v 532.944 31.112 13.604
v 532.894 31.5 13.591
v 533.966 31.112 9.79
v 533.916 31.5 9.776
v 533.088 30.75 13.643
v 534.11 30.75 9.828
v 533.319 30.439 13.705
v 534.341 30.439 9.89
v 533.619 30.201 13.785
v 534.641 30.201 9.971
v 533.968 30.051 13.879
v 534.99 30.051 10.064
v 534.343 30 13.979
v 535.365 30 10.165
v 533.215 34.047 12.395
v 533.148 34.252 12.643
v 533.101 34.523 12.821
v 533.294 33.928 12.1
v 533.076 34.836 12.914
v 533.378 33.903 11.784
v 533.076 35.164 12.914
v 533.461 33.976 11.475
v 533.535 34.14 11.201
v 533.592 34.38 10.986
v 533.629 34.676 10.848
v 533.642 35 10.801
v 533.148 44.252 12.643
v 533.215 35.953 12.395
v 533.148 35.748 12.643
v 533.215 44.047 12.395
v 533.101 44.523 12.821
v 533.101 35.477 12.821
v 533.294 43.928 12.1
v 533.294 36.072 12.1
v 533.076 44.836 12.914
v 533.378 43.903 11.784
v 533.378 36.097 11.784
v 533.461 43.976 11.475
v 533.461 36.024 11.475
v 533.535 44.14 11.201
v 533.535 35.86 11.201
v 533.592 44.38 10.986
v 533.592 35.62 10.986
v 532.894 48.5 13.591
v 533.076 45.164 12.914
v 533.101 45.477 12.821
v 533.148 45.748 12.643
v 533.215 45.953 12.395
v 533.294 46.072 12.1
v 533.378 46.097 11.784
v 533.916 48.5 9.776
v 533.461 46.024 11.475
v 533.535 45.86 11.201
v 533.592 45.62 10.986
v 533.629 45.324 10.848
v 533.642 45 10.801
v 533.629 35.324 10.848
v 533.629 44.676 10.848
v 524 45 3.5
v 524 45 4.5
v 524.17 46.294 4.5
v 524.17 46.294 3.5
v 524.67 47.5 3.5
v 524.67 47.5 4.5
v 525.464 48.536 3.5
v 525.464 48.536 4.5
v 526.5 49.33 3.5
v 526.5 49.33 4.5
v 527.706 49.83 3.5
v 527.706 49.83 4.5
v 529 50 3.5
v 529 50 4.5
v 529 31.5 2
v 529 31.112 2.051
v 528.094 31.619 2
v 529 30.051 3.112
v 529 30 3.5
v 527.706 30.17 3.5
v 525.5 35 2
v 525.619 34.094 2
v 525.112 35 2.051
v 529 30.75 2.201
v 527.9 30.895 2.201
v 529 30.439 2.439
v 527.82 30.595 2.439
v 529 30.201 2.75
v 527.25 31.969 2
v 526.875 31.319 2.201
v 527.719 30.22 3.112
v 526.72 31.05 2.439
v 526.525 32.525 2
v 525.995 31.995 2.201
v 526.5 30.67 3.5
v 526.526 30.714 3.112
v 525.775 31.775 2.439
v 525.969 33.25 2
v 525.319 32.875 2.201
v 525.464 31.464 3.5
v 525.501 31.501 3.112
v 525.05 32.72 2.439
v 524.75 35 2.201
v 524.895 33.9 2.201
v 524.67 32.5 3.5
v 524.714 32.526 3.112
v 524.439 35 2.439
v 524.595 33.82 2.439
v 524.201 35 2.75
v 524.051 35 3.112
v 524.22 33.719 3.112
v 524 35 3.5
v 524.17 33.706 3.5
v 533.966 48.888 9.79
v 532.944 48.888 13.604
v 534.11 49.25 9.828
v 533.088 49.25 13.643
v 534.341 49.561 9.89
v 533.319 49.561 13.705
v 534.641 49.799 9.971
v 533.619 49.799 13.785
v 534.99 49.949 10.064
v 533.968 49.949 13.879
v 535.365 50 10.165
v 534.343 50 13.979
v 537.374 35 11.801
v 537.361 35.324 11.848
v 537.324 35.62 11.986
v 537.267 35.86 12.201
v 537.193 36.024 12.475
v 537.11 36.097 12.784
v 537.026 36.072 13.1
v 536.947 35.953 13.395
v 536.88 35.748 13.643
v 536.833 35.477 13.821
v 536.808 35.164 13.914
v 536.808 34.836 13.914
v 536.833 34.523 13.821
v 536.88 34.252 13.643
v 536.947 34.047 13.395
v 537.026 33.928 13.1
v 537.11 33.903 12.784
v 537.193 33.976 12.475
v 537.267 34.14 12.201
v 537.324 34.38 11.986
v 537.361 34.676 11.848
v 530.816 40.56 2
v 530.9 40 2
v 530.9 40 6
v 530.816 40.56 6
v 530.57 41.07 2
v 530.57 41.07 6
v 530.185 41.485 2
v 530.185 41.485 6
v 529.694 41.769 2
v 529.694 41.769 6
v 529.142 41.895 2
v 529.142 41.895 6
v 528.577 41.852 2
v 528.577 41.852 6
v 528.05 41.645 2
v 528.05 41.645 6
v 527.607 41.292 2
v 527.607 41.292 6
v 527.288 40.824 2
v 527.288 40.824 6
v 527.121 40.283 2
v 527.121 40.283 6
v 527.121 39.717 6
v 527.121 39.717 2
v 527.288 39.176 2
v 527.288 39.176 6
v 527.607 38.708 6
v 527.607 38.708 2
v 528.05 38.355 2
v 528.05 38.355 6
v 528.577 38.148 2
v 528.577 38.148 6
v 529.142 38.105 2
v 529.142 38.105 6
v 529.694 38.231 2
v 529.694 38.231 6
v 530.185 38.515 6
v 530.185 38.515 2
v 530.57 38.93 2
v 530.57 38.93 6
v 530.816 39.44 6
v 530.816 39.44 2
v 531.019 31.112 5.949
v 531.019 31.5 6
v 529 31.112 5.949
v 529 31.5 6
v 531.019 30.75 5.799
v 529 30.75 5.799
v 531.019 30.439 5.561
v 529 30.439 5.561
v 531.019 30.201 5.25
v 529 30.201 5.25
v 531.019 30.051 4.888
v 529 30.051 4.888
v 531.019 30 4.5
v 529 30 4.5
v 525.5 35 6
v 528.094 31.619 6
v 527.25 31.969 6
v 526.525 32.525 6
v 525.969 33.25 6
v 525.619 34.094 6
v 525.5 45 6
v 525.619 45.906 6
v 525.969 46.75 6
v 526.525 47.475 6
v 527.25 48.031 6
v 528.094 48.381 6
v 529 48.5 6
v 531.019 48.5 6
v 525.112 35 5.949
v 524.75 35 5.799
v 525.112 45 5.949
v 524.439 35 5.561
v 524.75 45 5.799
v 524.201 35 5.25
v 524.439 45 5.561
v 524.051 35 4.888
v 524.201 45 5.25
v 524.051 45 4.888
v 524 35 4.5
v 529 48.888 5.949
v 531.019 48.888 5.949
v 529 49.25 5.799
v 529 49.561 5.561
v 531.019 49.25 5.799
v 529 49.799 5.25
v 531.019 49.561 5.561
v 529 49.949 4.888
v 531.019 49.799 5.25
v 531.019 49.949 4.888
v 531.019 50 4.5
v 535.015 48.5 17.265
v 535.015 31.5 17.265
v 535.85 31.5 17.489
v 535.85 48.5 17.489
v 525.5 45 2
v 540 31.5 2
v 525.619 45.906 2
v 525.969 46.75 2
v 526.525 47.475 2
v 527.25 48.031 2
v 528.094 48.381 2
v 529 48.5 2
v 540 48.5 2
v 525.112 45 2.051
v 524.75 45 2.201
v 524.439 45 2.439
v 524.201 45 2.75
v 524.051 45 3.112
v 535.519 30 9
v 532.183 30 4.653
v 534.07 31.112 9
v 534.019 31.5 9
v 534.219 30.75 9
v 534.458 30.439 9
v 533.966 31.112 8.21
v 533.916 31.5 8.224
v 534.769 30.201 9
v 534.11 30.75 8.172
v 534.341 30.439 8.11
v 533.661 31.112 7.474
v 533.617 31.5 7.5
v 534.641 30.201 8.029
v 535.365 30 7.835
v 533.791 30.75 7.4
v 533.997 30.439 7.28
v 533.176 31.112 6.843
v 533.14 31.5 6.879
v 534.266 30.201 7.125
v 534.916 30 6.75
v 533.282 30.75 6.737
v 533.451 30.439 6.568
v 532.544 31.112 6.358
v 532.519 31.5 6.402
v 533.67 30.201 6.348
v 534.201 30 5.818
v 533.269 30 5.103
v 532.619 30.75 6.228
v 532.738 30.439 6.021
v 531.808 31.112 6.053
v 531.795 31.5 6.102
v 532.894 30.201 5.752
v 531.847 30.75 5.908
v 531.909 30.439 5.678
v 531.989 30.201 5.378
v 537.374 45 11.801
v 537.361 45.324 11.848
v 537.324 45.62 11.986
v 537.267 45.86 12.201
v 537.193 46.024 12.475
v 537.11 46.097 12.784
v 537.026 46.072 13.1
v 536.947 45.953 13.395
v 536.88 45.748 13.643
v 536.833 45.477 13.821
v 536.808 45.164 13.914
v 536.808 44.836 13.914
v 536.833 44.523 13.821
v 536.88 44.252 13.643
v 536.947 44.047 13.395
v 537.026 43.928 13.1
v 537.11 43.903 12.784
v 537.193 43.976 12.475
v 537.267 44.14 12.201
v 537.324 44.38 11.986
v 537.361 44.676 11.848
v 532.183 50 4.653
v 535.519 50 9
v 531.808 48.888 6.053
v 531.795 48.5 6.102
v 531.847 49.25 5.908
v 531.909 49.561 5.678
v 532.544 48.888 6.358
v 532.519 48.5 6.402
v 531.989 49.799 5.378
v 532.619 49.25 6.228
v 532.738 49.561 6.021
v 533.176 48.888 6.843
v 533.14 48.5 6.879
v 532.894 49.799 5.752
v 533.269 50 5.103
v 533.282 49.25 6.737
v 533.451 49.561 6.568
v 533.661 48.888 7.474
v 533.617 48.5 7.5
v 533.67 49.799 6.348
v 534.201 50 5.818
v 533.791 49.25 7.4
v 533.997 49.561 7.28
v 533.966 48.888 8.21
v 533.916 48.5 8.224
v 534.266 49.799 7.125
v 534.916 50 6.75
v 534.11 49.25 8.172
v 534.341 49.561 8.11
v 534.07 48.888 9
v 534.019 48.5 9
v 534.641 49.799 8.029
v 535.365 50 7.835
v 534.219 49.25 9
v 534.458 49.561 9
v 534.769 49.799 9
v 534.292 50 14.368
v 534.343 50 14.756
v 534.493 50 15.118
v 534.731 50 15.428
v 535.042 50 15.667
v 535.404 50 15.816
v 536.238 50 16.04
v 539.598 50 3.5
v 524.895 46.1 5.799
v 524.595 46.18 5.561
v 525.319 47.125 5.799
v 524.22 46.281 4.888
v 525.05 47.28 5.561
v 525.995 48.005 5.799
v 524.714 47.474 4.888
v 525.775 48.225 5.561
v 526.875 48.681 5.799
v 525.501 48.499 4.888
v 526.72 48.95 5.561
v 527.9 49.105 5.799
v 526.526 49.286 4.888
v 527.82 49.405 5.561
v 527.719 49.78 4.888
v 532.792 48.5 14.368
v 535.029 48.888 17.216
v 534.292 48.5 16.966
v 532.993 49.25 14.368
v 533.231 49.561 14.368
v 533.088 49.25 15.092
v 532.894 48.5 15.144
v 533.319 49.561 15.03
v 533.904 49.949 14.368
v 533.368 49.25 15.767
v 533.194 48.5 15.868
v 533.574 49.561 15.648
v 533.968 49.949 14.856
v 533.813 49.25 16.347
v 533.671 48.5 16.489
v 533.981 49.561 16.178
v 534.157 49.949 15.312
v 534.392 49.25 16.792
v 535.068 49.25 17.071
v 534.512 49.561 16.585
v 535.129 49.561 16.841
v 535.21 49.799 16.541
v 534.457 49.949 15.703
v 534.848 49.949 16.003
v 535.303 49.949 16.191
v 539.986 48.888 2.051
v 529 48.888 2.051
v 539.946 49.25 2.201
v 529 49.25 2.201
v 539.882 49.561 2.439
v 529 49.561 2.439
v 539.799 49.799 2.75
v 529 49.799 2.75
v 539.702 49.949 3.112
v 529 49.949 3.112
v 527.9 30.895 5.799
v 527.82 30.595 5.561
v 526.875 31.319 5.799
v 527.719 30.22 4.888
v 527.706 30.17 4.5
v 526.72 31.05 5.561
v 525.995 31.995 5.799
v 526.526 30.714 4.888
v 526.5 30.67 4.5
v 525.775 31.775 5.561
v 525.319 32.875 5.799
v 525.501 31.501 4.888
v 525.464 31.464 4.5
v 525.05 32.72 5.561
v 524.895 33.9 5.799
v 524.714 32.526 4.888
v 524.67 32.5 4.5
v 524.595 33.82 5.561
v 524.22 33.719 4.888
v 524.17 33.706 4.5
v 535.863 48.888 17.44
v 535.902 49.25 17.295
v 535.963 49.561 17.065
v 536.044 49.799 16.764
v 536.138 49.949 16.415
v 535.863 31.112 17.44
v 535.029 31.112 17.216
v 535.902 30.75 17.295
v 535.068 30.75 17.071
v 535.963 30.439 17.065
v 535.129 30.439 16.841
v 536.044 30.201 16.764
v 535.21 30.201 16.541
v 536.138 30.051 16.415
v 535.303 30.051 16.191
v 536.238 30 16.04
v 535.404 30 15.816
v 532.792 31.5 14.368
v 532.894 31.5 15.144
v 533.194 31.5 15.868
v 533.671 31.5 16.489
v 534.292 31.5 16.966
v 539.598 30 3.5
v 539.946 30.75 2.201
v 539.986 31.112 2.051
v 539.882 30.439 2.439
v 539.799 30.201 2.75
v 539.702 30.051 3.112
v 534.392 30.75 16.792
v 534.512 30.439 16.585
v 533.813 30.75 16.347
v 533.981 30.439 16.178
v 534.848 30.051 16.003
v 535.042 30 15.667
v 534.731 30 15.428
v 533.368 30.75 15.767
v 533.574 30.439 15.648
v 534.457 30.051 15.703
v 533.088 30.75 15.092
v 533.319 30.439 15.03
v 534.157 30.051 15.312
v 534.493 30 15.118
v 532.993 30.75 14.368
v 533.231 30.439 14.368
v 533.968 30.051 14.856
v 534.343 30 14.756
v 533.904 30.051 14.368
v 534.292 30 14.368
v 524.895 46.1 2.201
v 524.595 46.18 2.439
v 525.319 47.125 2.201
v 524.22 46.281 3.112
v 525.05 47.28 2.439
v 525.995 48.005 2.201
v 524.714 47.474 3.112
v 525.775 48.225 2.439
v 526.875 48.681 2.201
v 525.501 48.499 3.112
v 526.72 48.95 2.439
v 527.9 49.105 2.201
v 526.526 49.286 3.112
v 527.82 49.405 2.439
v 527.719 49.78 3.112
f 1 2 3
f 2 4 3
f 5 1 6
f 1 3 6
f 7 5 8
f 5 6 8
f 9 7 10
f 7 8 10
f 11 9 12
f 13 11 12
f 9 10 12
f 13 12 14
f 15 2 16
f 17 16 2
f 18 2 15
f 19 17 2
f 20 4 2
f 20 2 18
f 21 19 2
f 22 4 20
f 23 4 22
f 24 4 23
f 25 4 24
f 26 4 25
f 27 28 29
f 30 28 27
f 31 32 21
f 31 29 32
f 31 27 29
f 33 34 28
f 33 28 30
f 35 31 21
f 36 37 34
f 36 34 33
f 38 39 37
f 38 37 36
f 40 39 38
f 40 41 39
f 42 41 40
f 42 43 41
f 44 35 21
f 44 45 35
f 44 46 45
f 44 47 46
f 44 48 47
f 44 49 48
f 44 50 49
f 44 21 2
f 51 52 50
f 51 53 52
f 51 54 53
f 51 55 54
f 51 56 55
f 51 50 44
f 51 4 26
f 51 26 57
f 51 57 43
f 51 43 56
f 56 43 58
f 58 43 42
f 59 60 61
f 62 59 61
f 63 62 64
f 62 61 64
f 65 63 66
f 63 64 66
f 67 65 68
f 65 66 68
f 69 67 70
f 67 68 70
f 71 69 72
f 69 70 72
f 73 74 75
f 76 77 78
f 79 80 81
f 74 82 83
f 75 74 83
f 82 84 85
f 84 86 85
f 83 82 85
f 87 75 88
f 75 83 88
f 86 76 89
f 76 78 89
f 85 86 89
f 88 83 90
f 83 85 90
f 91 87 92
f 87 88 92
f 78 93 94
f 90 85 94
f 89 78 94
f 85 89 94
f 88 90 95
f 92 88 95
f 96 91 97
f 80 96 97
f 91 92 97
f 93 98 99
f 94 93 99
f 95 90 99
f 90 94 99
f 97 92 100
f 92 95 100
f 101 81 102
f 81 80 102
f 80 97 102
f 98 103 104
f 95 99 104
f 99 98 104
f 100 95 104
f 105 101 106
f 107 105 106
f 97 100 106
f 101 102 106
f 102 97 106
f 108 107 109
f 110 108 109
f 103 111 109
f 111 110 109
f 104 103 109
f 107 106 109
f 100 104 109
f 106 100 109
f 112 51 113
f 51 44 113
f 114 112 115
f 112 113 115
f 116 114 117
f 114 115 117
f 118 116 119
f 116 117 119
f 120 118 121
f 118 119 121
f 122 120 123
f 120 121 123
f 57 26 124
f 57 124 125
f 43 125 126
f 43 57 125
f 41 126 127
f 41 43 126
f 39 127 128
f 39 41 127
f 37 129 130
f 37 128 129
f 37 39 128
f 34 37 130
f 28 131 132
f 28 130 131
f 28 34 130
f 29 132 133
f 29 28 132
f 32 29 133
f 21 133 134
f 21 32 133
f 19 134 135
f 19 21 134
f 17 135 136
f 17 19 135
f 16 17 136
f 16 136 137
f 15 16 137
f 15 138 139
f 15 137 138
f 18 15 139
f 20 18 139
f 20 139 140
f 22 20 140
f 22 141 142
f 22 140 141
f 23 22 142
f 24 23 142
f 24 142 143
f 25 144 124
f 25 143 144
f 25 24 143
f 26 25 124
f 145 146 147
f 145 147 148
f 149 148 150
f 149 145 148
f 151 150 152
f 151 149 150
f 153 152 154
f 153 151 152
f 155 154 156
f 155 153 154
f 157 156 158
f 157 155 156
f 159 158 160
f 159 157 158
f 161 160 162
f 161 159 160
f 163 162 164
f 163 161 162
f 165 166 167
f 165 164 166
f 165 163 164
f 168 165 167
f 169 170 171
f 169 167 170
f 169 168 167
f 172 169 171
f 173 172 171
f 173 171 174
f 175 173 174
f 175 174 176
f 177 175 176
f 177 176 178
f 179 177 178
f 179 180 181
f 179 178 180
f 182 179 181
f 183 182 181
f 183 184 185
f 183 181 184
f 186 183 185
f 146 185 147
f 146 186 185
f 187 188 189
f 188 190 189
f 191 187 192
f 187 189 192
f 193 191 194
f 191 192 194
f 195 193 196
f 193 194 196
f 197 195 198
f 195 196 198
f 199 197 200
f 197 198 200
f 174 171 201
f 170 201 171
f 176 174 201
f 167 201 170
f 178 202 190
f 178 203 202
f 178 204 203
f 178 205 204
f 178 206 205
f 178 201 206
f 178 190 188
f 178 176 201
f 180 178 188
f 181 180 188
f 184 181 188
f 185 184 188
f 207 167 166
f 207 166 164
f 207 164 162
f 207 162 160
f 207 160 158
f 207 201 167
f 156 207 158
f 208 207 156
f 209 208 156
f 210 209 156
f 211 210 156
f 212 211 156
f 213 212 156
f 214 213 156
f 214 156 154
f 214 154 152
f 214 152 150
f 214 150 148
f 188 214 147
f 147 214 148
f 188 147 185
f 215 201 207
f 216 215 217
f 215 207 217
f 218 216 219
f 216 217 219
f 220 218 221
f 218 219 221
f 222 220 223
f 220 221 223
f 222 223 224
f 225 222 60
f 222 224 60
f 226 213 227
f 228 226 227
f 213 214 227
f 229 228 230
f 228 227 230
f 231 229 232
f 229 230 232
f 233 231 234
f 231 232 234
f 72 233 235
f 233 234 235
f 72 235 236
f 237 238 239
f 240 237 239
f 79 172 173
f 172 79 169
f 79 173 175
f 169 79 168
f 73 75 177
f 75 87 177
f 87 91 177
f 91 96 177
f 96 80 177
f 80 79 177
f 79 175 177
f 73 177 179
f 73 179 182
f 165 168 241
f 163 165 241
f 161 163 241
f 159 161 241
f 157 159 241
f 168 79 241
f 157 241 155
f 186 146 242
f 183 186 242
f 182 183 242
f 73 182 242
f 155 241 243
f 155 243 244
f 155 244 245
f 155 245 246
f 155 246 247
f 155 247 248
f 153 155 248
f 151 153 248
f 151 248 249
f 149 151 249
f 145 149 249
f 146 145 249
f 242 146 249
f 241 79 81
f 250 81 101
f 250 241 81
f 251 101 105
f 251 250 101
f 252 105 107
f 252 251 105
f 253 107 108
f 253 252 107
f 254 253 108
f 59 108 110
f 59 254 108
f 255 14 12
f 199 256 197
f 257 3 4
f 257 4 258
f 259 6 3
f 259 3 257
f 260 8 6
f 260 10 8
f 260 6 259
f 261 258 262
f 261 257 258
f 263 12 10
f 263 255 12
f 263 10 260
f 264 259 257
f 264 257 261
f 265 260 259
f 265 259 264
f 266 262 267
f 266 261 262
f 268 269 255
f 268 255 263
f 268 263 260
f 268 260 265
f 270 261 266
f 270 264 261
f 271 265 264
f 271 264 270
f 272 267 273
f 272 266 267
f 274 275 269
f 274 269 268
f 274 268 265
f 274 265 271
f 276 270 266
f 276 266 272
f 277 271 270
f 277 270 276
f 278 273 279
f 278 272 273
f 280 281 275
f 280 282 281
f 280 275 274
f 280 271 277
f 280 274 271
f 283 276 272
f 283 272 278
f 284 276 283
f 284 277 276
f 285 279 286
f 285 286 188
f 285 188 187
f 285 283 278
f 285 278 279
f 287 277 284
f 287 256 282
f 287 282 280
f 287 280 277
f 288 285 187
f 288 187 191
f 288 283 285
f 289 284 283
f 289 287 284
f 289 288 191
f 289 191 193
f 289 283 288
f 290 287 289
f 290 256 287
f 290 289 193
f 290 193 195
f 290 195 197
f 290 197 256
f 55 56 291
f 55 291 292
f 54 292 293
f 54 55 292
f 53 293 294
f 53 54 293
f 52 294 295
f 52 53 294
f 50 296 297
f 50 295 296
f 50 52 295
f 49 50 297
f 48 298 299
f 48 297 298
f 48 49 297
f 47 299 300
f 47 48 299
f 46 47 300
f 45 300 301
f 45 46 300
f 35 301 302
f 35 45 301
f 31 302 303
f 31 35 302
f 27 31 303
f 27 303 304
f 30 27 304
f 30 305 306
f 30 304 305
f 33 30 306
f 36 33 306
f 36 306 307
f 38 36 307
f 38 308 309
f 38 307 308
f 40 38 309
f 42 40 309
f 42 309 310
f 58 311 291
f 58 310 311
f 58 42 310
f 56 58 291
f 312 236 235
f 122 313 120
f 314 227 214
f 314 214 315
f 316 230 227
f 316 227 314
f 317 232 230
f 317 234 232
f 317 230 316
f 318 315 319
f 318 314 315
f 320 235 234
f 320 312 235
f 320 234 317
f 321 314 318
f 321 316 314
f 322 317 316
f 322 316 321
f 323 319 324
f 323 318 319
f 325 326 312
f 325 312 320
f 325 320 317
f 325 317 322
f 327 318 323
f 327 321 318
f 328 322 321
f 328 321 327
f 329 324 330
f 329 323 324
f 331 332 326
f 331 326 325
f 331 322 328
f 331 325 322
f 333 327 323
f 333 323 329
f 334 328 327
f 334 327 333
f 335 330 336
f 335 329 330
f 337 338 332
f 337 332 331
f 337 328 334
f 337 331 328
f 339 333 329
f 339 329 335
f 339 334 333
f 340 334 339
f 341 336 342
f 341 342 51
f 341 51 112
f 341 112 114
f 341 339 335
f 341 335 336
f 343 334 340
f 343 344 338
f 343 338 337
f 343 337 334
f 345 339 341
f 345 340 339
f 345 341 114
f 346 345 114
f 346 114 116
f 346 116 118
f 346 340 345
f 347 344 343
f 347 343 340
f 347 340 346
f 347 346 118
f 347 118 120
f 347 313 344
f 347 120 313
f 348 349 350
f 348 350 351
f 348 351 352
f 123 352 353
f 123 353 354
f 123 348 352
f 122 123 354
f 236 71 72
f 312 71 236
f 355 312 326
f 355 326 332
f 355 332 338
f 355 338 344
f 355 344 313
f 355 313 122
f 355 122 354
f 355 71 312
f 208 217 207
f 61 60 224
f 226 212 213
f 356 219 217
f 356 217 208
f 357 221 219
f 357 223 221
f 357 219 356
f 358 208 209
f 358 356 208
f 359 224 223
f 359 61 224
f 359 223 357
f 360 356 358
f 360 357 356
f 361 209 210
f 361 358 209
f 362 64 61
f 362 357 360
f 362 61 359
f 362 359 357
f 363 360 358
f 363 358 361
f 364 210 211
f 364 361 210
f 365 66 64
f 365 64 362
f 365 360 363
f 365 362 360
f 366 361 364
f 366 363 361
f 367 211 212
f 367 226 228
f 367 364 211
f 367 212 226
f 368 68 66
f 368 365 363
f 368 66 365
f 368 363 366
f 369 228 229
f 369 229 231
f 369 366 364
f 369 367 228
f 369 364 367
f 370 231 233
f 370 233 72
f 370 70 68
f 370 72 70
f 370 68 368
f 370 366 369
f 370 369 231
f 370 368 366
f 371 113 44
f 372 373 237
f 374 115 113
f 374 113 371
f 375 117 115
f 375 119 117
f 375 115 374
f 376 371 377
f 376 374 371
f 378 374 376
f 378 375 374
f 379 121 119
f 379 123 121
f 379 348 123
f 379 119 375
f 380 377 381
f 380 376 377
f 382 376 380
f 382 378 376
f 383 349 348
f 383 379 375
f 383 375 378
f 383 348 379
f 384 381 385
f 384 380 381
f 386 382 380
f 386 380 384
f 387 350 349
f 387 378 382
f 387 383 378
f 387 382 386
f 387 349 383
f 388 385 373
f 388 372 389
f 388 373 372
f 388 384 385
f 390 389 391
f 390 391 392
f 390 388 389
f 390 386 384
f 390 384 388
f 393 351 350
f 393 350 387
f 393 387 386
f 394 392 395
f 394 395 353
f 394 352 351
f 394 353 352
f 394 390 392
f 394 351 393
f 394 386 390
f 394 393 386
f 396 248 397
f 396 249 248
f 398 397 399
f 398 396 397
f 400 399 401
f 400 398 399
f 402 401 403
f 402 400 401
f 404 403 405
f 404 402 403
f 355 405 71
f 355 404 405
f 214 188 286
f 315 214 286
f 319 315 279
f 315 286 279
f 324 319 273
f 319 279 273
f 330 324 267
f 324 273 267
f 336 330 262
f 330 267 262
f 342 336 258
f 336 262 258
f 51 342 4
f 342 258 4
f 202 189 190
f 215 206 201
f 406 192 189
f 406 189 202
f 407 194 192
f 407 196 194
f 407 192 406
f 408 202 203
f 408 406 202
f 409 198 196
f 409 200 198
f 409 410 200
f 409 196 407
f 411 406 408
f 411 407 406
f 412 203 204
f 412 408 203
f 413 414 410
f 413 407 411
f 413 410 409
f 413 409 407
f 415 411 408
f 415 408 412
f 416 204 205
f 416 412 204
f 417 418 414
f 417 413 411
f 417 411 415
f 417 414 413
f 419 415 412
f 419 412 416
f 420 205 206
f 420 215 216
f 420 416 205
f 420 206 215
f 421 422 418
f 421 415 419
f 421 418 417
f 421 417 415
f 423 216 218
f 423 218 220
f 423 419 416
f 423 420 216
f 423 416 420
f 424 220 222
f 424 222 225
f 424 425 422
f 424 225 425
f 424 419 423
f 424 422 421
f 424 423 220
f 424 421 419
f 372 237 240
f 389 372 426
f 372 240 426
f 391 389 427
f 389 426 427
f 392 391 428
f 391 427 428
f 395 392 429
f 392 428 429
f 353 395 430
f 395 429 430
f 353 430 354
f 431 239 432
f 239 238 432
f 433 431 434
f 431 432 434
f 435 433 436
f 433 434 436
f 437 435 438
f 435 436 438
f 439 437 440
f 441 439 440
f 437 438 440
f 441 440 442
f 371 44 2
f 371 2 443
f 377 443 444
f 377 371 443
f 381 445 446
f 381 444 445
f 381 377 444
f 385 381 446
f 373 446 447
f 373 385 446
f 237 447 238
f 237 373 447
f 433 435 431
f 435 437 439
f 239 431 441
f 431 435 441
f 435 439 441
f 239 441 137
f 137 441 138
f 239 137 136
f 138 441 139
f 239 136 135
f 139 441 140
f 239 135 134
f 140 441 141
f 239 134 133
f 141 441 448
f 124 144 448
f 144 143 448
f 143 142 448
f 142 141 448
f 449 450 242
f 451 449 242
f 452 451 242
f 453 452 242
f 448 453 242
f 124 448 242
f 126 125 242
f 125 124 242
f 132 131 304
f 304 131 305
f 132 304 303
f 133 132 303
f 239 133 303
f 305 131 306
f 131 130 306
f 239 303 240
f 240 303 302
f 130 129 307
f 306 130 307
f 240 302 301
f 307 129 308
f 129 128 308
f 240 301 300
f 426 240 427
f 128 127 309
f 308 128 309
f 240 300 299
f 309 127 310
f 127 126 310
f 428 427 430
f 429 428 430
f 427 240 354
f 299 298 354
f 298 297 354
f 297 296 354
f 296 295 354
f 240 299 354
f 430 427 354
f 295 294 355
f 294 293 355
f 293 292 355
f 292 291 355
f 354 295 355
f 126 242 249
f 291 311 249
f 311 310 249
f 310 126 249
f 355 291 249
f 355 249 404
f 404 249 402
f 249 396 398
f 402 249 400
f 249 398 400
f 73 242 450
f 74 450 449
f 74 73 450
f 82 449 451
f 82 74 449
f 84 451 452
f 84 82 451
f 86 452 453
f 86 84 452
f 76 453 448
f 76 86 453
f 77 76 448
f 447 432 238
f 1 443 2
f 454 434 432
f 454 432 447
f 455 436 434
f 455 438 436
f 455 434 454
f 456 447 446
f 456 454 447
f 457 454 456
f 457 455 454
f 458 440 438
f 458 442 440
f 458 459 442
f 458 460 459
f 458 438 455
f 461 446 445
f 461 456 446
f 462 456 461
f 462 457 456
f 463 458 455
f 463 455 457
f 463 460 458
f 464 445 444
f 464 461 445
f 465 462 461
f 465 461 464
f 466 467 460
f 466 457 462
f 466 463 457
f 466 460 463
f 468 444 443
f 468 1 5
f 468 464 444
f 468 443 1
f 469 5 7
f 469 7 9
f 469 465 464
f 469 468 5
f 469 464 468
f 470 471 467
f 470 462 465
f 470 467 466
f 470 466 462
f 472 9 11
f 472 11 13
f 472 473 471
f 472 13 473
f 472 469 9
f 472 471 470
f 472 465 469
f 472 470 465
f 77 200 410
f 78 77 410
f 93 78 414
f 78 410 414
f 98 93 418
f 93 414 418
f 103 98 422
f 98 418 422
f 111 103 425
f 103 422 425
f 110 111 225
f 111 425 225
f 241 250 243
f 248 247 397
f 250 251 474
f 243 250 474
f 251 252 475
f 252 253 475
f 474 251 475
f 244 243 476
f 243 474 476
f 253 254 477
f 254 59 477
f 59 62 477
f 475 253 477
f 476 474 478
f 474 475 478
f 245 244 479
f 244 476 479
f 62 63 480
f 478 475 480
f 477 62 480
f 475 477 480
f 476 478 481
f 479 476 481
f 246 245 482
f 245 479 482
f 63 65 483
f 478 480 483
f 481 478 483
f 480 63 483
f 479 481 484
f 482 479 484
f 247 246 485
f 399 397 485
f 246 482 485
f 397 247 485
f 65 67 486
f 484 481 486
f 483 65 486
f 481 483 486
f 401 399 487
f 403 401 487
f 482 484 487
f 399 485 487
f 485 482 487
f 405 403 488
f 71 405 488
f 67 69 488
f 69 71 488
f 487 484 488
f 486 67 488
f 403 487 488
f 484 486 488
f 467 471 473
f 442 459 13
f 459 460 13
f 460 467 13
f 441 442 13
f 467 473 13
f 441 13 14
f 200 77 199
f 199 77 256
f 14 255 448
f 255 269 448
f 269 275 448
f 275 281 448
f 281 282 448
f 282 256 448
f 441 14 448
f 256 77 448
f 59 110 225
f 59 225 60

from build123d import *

# Parameters (mm, degrees)
CYLINDER081_R               = 1.9
CYLINDER081_DEPTH           = 20
BOX082_W                    = 3
BOX082_H                    = 24
BOX082_DEPTH                = 20
BOX082_PITCH_ANGLE          = -15
CYLINDER082_R               = 1.1
CYLINDER082_DEPTH           = 20
CYLINDER082_PLACEMENT_ANGLE = 75
CYLINDER083_R               = 1.1
CYLINDER083_DEPTH           = 20
CYLINDER083_PLACEMENT_ANGLE = 75
BOX080_W                    = 5
BOX080_H                    = 20
BOX080_DEPTH                = 15
BOX080_PITCH_ANGLE          = -15
BOX081_W                    = 16
BOX081_H                    = 20
BOX081_DEPTH                = 4
FILLET019_R                 = 5
FILLET021_R                 = 3
FILLET022_R                 = 3
FILLET023_R                 = 1.5


with BuildPart() as cylinder081:
    # Cylinder081 → Cylinder081 (new body)
    with BuildSketch(Plane(origin=(529, 40, -10), x_dir=(1, 0, 0), z_dir=(0, 0, 1))):
        Circle(CYLINDER081_R)
    extrude(amount=CYLINDER081_DEPTH)


with BuildPart() as cube054:
    # Box082 → Box082 (new body)
    with BuildSketch(Plane.XY):
        with Locations((1.5, 12)):
            Rectangle(BOX082_W, BOX082_H)
    extrude(amount=BOX082_DEPTH)


with BuildPart() as cube054_1:
    # Box082 pitch: moved
    add(cube054.part.rotate(Axis((0, 0, 0), (0, 1, 0)), BOX082_PITCH_ANGLE))


with BuildPart() as cube054_2:
    # Box082 placement: moved
    add(cube054_1.part.moved(Location((540, 28, 2))))


with BuildPart() as cylinder082:
    # Cylinder082 → Cylinder082 (new body)
    with BuildSketch(Plane.XY):
        Circle(CYLINDER082_R)
    extrude(amount=CYLINDER082_DEPTH)


with BuildPart() as cylinder082_1:
    # Cylinder082 placement: moved
    add(cylinder082.part.moved(Location((532, 35, 7.5))).rotate(Axis((532, 35, 7.5), (0, 1, 0)), CYLINDER082_PLACEMENT_ANGLE))


with BuildPart() as fusion090:
    # Cylinder083 → Cylinder083 (new body)
    with BuildSketch(Plane.XY):
        Circle(CYLINDER083_R)
    extrude(amount=CYLINDER083_DEPTH)


with BuildPart() as fusion090_1:
    # Cylinder083 placement: moved
    add(fusion090.part.moved(Location((532, 45, 7.5))).rotate(Axis((532, 45, 7.5), (0, 1, 0)), CYLINDER083_PLACEMENT_ANGLE))

    # Fusion090: union Cylinder082
    add(cylinder082_1.part)


with BuildPart() as fusion090_2:
    # Fusion090 placement: moved
    add(fusion090_1.part.moved(Location((0, 0, 4))))


with BuildPart() as cube052:
    # Box080 → Box080 (new body)
    with BuildSketch(Plane.XY):
        with Locations((2.5, 10)):
            Rectangle(BOX080_W, BOX080_H)
    extrude(amount=BOX080_DEPTH)


with BuildPart() as cube052_1:
    # Box080 pitch: moved
    add(cube052.part.rotate(Axis((0, 0, 0), (0, 1, 0)), BOX080_PITCH_ANGLE))


with BuildPart() as cube052_2:
    # Box080 placement: moved
    add(cube052_1.part.moved(Location((536, 30, 2))))


with BuildPart() as rear_door_closure_lock:
    # Box081 → Box081 (new body)
    with BuildSketch(Plane(origin=(524, 30, 2), x_dir=(1, 0, 0), z_dir=(0, 0, 1))):
        with Locations((8, 10)):
            Rectangle(BOX081_W, BOX081_H)
    extrude(amount=BOX081_DEPTH)

    # Fusion095: union Cube052
    add(cube052_2.part)

    # Cut102: cut Fusion090
    add(fusion090_2.part, mode=Mode.SUBTRACT)

    # Cut103: cut Cube054
    add(cube054_2.part, mode=Mode.SUBTRACT)

    # Cut104: cut Cylinder081
    add(cylinder081.part, mode=Mode.SUBTRACT)

    # Fillet019
    fillet019_edges = [rear_door_closure_lock.edges().sort_by_distance(p)[0] for p in [
        (524, 30, 4),
        (524, 50, 4),
    ]]
    fillet(fillet019_edges, radius=FILLET019_R)

    # Fillet021
    fillet021_edges = [rear_door_closure_lock.edges().sort_by_distance(p)[0] for p in [
        (534.928203, 40, 6),
    ]]
    fillet(fillet021_edges, radius=FILLET021_R)

    # Fillet022
    fillet022_edges = [rear_door_closure_lock.edges().sort_by_distance(p)[0] for p in [
        (532.117714, 40, 16.488887),
    ]]
    fillet(fillet022_edges, radius=FILLET022_R)

    # Fillet023
    fillet023_edges = [rear_door_closure_lock.edges().sort_by_distance(p)[0] for p in [
        (524, 40, 6),
        (524, 40, 2),
    ]]
    fillet(fillet023_edges, radius=FILLET023_R)


solid = rear_door_closure_lock.part
